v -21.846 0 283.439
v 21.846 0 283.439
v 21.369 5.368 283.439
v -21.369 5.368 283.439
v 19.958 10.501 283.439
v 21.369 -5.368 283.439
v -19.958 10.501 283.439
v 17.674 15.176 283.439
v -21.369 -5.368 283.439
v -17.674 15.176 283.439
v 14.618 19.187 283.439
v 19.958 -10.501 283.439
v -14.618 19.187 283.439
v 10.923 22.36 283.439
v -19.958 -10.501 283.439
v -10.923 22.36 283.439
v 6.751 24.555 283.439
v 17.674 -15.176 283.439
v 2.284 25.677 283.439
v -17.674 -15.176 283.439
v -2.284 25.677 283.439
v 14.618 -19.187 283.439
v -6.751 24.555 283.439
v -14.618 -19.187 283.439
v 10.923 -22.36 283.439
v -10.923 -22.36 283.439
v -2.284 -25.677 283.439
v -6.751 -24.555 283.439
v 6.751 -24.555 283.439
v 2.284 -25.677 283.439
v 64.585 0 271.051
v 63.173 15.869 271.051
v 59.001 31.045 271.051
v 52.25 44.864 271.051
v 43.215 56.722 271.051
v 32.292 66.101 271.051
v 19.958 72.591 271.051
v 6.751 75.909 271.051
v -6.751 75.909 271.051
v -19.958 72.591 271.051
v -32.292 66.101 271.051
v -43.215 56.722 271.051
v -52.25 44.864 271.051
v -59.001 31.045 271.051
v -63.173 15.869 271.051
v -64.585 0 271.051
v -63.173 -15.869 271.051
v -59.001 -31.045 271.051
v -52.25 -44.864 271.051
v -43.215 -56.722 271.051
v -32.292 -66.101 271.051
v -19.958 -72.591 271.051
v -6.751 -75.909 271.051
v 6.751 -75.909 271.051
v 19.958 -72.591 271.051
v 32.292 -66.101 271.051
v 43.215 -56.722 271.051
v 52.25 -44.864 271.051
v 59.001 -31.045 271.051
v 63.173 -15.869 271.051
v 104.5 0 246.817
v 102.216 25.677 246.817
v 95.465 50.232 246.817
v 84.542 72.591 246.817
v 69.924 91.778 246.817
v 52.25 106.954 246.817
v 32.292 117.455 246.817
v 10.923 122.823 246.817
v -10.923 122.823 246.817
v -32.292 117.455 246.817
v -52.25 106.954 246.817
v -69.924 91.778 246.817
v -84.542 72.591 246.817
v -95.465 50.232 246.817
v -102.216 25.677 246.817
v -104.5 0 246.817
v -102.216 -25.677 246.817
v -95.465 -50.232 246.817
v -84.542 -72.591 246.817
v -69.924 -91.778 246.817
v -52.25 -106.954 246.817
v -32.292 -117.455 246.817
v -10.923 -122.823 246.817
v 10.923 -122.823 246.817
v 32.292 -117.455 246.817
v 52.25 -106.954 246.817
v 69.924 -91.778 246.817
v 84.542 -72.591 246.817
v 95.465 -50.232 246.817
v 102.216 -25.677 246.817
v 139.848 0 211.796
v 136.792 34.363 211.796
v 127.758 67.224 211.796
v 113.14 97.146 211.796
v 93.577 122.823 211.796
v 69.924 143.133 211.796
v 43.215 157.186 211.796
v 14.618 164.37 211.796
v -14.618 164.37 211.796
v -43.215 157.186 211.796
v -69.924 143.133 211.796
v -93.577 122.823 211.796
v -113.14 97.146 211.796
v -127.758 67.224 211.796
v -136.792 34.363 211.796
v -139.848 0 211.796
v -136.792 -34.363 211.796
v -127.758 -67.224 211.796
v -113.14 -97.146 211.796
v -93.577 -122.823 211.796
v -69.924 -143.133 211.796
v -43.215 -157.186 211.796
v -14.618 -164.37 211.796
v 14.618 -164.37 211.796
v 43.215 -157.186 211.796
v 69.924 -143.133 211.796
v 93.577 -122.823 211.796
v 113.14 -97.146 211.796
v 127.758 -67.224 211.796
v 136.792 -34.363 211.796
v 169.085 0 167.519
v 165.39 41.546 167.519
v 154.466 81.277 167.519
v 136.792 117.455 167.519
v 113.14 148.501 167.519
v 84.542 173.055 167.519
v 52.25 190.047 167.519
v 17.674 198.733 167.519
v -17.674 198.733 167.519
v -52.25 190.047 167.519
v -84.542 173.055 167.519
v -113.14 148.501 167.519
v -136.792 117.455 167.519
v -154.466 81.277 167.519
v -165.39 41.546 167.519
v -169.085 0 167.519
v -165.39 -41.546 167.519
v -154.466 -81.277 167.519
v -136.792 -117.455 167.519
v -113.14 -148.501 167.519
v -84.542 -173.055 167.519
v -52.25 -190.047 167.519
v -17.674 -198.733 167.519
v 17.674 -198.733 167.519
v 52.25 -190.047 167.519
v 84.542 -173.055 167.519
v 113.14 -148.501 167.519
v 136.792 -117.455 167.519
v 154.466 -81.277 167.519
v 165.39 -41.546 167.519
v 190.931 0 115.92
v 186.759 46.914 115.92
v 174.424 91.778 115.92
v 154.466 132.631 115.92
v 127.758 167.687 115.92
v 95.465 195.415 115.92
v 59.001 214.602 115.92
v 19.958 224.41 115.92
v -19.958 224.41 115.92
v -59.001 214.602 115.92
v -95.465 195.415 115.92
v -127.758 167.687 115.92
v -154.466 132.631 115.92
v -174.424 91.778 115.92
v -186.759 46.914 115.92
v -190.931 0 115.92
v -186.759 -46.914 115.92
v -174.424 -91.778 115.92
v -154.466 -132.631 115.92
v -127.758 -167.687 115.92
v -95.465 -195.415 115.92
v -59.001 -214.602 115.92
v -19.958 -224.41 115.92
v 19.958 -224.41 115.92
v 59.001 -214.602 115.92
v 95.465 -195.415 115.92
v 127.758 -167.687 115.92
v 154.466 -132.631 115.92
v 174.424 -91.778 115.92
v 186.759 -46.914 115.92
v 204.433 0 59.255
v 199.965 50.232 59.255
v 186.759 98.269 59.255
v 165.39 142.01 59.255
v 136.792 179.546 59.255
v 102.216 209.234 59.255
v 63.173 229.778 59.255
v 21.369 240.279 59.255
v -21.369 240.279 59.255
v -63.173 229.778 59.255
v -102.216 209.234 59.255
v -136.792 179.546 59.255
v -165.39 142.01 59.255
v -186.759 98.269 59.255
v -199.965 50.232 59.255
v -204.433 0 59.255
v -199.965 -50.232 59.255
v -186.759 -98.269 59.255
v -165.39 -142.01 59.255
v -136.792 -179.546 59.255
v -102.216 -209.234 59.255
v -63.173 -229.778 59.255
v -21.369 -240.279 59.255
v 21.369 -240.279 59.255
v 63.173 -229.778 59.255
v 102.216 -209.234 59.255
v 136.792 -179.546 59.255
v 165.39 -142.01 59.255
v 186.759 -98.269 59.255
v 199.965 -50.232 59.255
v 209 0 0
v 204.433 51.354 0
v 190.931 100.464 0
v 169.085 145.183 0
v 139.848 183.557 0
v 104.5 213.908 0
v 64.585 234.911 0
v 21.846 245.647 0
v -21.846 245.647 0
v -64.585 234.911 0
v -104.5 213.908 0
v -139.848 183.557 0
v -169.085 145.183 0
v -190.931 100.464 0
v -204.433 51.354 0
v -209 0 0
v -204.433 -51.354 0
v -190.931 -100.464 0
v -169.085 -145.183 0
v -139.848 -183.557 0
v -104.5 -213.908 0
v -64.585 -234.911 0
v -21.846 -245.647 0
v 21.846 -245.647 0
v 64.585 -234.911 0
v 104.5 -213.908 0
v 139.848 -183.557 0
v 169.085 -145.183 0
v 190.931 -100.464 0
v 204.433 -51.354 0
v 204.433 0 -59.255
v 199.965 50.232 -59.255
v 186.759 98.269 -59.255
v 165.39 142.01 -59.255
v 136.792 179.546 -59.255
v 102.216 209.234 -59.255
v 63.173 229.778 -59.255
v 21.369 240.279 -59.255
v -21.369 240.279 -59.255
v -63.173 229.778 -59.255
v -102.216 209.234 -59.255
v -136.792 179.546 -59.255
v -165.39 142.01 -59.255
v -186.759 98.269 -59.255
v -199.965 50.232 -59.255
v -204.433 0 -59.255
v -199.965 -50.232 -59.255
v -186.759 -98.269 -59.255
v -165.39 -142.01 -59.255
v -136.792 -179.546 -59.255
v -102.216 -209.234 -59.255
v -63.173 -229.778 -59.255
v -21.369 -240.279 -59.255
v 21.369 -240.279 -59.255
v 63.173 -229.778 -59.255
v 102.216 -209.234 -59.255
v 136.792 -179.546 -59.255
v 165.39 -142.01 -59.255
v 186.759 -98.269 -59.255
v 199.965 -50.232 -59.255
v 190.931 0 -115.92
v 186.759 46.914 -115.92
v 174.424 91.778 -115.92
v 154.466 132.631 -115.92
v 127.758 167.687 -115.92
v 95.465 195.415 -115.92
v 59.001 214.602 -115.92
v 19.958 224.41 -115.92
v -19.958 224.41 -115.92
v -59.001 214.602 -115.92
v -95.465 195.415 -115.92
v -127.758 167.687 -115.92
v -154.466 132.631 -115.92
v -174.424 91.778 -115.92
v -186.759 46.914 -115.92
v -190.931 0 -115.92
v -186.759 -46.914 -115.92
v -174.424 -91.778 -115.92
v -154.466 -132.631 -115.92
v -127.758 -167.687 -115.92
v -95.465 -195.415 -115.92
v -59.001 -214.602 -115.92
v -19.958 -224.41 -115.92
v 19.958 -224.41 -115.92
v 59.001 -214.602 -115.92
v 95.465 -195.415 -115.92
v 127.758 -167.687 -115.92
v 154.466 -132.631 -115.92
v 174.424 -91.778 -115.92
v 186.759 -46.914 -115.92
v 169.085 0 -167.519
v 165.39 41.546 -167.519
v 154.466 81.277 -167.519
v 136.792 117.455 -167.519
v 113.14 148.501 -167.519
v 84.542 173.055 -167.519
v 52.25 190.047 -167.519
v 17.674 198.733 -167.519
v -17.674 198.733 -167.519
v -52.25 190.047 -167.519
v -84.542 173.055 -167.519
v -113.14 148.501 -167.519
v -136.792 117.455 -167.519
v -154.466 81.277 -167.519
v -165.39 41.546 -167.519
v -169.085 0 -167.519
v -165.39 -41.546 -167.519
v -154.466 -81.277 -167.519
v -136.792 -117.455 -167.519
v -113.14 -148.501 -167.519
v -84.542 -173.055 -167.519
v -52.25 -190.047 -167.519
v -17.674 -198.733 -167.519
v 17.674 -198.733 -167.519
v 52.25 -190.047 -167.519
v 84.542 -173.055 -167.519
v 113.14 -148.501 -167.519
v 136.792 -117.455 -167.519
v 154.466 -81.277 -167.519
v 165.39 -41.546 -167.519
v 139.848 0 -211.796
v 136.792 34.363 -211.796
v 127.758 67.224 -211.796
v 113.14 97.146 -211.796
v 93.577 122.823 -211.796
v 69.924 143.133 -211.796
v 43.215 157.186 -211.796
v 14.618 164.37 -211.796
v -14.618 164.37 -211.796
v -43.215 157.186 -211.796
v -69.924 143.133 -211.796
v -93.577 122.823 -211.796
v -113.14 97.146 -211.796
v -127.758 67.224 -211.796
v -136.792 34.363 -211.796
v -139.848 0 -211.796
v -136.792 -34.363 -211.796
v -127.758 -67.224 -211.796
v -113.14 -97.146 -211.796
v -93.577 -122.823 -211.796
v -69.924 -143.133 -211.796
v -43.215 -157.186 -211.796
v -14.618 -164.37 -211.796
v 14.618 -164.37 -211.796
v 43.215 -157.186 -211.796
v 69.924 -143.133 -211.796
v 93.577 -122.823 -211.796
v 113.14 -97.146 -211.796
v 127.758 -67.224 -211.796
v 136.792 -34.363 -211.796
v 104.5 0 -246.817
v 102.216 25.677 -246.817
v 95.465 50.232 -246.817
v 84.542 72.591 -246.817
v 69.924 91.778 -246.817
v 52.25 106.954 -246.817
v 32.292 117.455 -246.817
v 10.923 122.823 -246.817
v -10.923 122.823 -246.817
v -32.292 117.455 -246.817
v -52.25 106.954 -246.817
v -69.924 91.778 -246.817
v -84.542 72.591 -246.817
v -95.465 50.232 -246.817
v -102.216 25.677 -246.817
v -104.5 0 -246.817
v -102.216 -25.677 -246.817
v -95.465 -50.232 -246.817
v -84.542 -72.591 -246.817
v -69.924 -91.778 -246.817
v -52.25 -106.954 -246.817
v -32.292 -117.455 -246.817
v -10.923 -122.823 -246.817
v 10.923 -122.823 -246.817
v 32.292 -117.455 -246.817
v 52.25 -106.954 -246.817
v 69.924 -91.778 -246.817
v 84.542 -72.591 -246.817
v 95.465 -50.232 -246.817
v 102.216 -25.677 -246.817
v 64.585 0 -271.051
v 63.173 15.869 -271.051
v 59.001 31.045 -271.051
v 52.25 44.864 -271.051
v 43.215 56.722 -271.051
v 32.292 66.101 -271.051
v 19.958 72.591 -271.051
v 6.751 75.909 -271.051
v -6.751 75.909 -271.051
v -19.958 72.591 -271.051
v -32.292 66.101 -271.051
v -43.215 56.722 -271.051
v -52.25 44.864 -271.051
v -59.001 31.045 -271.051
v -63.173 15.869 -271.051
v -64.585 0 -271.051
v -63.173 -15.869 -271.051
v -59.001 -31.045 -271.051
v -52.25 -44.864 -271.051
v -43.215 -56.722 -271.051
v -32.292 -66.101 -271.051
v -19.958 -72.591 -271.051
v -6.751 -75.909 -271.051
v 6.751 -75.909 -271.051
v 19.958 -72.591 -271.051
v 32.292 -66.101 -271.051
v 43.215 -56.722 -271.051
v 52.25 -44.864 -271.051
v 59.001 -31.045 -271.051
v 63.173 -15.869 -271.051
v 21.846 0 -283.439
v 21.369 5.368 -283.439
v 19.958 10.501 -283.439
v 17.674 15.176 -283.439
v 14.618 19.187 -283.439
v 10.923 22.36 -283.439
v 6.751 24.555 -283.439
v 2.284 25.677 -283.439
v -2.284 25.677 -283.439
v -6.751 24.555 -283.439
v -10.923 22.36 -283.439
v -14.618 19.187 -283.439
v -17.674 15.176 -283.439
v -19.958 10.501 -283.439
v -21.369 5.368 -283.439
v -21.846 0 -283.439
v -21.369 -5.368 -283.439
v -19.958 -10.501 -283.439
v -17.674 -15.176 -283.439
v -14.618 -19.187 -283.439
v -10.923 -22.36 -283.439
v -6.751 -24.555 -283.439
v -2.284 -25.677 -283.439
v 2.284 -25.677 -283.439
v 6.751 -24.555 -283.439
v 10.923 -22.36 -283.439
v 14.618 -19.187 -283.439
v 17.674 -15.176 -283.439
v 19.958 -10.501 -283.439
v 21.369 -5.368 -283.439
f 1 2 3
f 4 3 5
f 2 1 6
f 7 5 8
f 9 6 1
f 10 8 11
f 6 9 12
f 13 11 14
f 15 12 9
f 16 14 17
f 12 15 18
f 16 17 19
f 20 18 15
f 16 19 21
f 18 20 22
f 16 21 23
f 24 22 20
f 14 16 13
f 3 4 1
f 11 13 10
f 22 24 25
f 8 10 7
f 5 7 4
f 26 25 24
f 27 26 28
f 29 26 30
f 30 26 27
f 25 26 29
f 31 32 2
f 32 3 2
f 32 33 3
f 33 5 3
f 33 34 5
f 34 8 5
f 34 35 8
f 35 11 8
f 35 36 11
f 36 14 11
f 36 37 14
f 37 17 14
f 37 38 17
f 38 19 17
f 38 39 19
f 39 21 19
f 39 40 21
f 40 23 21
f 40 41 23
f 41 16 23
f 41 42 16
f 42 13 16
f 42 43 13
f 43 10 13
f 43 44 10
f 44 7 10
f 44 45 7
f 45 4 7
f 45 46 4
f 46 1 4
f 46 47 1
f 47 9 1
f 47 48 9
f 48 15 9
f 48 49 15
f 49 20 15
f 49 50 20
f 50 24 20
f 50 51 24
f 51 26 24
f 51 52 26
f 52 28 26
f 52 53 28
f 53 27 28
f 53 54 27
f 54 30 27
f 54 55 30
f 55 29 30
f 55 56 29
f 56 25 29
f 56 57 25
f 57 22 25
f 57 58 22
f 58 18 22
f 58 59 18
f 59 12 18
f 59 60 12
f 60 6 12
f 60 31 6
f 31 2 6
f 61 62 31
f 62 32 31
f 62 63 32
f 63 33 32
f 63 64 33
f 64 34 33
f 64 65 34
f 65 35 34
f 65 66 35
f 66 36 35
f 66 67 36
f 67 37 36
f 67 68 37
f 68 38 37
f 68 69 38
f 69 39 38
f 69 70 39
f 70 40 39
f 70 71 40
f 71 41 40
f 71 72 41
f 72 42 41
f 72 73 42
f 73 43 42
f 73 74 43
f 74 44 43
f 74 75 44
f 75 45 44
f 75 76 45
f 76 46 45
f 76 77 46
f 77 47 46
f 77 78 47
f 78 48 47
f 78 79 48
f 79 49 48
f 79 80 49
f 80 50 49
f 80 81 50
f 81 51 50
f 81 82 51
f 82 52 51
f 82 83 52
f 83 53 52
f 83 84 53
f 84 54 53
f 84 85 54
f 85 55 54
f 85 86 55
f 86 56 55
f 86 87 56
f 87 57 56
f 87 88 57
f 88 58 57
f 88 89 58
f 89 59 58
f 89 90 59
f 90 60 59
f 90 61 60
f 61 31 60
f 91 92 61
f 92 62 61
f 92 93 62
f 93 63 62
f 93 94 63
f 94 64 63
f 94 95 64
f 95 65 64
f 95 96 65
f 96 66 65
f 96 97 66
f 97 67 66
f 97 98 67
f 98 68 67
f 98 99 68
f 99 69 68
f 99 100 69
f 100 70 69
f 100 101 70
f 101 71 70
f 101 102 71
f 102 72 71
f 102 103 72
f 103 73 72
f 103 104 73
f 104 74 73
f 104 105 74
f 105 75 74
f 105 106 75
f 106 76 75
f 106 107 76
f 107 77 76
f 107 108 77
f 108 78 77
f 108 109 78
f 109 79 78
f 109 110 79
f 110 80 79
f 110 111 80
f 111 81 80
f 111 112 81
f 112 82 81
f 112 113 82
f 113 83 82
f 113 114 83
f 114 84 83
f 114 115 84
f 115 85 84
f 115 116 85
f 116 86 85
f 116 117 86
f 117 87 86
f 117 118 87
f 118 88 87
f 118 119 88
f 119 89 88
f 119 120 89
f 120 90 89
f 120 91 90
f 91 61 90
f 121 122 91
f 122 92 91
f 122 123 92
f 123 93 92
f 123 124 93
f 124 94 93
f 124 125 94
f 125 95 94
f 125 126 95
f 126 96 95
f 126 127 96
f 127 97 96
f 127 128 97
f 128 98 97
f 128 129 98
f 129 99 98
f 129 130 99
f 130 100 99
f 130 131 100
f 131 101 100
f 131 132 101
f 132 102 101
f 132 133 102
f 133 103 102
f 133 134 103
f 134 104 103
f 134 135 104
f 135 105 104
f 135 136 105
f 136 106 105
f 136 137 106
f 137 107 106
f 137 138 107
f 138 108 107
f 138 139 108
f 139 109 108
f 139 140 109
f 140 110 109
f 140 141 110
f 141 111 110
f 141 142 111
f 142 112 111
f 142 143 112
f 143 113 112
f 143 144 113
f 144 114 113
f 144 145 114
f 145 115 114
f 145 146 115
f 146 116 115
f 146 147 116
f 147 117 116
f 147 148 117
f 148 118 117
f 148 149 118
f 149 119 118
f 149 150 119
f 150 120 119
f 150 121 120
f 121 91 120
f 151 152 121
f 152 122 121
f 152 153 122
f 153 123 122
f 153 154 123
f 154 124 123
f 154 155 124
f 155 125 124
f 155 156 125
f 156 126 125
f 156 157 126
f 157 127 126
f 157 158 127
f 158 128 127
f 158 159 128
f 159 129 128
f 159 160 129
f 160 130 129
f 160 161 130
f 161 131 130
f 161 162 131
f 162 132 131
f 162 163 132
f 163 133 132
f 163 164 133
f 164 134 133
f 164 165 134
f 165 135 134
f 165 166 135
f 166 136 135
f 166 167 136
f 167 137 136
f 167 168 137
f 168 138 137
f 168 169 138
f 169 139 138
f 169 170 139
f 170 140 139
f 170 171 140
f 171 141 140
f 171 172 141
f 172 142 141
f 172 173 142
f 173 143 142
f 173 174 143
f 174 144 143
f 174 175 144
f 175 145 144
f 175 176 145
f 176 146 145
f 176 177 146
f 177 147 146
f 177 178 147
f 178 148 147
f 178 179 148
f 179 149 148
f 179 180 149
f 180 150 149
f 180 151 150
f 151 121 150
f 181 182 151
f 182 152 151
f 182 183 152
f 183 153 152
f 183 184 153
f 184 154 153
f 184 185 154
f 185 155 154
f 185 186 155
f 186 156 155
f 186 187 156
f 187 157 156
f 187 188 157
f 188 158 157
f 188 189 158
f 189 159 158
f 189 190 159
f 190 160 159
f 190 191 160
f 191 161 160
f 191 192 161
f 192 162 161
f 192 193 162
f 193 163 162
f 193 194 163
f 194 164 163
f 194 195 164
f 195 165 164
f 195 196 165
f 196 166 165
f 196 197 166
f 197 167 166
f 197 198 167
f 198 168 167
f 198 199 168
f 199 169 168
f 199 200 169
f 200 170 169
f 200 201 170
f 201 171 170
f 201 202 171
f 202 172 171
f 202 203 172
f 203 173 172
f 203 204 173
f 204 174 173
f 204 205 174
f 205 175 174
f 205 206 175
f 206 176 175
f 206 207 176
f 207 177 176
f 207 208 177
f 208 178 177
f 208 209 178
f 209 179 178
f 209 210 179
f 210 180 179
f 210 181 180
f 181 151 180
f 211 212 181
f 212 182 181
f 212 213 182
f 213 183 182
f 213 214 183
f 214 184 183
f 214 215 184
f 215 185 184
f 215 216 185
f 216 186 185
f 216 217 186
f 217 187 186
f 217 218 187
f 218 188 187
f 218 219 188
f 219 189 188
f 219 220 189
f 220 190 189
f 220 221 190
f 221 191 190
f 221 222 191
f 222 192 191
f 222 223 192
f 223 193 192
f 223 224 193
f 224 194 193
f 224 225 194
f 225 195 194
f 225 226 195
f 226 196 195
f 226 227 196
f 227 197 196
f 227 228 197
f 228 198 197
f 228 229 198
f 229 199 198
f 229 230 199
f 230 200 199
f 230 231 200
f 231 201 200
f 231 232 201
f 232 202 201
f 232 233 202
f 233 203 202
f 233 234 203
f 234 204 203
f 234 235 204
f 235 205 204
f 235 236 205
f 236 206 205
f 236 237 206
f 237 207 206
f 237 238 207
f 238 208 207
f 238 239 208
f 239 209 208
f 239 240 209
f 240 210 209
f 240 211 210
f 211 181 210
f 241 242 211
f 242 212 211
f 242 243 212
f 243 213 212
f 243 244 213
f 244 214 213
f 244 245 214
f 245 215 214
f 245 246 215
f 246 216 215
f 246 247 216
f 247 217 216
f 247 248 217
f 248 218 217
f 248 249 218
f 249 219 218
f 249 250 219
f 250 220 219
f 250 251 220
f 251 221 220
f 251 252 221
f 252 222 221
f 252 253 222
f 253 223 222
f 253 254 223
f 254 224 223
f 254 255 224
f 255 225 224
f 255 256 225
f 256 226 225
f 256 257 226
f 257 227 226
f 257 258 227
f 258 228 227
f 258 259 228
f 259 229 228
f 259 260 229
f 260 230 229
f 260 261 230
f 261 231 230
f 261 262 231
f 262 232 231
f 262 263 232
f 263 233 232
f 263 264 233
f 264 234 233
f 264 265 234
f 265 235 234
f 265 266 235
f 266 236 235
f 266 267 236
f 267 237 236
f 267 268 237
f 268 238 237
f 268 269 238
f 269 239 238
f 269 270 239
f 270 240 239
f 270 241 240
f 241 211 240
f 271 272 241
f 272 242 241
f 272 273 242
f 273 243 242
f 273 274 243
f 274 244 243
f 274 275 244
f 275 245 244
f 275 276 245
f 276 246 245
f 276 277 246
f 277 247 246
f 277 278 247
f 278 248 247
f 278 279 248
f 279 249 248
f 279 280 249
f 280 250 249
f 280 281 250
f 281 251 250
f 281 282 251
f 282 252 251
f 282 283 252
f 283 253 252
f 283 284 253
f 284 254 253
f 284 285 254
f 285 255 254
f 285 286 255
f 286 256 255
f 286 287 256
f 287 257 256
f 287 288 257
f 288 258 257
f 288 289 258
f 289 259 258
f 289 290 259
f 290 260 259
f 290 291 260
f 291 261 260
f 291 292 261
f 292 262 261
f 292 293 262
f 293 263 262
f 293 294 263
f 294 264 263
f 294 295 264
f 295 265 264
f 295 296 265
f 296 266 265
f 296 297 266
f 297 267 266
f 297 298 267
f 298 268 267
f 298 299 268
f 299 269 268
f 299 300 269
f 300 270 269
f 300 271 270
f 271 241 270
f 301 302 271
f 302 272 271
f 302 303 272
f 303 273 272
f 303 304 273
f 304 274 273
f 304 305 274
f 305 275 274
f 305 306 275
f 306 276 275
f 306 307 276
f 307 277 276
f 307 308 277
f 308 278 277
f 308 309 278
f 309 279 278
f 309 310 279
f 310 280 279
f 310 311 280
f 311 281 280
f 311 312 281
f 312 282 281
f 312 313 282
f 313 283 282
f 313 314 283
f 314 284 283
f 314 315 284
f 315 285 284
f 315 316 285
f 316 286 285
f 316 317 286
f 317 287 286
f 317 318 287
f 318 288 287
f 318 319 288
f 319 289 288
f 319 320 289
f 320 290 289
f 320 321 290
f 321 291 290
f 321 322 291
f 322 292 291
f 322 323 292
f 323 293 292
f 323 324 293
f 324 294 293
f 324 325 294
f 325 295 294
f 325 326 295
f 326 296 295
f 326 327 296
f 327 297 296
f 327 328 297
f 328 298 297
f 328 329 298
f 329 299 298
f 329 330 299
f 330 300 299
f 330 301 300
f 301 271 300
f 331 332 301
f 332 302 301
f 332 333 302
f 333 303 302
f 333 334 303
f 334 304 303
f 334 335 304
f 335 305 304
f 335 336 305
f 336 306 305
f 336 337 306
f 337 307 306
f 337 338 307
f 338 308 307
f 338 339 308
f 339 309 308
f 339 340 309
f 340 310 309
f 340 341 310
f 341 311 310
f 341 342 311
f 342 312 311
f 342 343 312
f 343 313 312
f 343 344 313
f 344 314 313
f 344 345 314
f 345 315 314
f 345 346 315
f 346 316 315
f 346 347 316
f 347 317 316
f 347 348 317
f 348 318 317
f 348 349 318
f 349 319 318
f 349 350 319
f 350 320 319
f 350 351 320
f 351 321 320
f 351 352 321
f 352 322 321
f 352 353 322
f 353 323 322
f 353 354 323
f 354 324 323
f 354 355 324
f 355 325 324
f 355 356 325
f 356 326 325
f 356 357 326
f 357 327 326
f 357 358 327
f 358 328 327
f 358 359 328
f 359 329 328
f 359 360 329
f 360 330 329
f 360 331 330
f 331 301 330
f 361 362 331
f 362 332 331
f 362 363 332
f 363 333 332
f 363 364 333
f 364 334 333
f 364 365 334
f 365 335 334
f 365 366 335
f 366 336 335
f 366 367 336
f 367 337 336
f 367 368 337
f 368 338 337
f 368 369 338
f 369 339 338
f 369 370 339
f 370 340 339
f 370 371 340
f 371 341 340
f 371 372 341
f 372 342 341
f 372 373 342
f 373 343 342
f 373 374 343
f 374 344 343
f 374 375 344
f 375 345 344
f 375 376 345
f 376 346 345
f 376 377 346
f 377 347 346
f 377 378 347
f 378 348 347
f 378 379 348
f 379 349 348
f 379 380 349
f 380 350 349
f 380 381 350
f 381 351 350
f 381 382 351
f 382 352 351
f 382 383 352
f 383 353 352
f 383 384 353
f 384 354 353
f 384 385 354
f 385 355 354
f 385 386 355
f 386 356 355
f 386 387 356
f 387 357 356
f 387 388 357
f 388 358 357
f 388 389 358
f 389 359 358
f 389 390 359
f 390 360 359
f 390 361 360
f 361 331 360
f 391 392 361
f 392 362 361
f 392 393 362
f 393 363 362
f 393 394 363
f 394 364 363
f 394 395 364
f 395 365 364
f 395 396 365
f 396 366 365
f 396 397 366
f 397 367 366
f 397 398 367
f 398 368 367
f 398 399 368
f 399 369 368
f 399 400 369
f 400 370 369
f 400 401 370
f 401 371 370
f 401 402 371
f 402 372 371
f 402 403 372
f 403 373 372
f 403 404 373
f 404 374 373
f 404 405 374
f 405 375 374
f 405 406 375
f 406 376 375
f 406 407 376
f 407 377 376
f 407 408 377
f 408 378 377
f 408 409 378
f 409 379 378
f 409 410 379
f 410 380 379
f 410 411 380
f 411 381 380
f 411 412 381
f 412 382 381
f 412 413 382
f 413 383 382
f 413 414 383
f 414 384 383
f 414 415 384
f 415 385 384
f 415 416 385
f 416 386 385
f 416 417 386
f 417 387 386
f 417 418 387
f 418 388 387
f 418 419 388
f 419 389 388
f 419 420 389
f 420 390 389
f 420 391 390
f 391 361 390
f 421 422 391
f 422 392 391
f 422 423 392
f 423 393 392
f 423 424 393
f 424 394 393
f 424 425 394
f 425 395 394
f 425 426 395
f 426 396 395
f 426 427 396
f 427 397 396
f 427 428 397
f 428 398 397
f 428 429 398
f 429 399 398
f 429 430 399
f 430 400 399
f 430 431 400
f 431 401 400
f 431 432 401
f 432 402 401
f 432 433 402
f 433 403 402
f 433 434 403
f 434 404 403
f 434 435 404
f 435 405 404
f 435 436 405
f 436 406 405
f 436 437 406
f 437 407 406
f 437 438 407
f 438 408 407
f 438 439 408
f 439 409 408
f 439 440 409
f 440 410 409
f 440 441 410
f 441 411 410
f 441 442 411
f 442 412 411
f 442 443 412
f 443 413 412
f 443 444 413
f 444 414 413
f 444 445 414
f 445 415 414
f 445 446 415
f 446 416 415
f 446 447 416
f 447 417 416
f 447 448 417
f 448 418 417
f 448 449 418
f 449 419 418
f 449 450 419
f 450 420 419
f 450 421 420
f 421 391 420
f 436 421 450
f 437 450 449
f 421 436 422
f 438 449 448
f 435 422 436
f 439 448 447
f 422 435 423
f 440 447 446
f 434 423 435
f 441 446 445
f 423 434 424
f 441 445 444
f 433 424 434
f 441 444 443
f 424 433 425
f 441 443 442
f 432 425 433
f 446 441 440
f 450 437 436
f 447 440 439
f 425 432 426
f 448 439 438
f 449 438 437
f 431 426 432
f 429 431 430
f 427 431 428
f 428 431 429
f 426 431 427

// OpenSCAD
// Generated by SolidPython 1.0.1 on 2020-07-29 00:39:26


scale(v = [11, 13, 15]) {
	sphere(r = 19);
}
/***********************************************
*********      SolidPython code:      **********
************************************************
 
# import packages: SolidPython
from solid import *
from solid.utils import *
from itertools import chain, combinations


class Resize:

    def __init__(self, scad_file):
        self.scad_file = scad_file
        #self.scad_file = import_scad(scad_file)
        # cone/cylinder param:
        self.r1 = 0
        self.r2 = 0
        self.h = 0
        # rectangular prism param:
        self.w = 0
        self.l = 0
        # ellipse param:
        self.r = 0

    # import OpenScad code (file name corresponds to shape)


    # classify shape + parameters
    def assign(self, param1, param2, param3):
        if self.scad_file == 'cone.scad':
            self.r1 = param1
            self.r2 = param2
            self.h = param3
        elif self.scad_file == 'cylinder.scad':
            self.r1 = param1
            self.r2 = param2
            self.h = param3
        elif self.scad_file == 'rectangularPrism.scad':
            self.h = param1
            self.l = param2
            self.w = param3
        else:
            self.r = param1
            self.h = param2

    # resize parameters
    def iterate(self):
        x = range(3, 20, 2)
        i = 1
        if self.scad_file == 'cone.scad':
            tempList = list(combinations(x, 2))
            for temp in tempList:
                param1 = temp[0]
                param2 = temp[1]
                filepath = 'produced_scad_files/' + 'cone' + str(param1) + '_' + str(param2) + '_' + '.scad'
                scad_render_to_file(cylinder(h=param1, r1=param2, r2=0), filepath)

        elif self.scad_file == 'cylinder.scad':
            tempList = list(combinations(x, 3))
            for temp in tempList:
                param1 = temp[0]
                param2 = temp[1]
                filepath = 'produced_scad_files/' + 'cylinder' + str(param1) + '_' + str(param2) + '_' + '.scad'
                scad_render_to_file(cylinder(h=param1, r1=param2, r2=param2), filepath)

        elif self.scad_file == 'rectangularPrism.scad':
            tempList = list(combinations(x, 3))
            for temp in tempList:
                param1 = temp[0]
                param2 = temp[1]
                param3 = temp[2]
                filepath = 'produced_scad_files/' + 'rectangularPrism' + str(param1) + '_' + str(param2) + '_' + str(
                    param3) + '.scad'
                scad_render_to_file(cube(size=(param1, param2, param3)), filepath)

        elif self.scad_file == 'ellipse.scad':
            tempList = list(combinations(x, 4))
            for temp in tempList:
                param1 = temp[0]
                param2 = temp[1]
                param3 = temp[2]
                param4 = temp[3]
                filepath = 'produced_scad_files/' + 'ellipse' + str(param1) + '_' + str(param2) + '_' + str(param3) + '_' + str(param4) + '.scad'
                scad_render_to_file(scale([param1, param2, param3])(sphere(r=param4)), filepath)

    def render_to_scadfile(self):
        scad_render_to_file(scad, 'example.scad') 
 
************************************************/
